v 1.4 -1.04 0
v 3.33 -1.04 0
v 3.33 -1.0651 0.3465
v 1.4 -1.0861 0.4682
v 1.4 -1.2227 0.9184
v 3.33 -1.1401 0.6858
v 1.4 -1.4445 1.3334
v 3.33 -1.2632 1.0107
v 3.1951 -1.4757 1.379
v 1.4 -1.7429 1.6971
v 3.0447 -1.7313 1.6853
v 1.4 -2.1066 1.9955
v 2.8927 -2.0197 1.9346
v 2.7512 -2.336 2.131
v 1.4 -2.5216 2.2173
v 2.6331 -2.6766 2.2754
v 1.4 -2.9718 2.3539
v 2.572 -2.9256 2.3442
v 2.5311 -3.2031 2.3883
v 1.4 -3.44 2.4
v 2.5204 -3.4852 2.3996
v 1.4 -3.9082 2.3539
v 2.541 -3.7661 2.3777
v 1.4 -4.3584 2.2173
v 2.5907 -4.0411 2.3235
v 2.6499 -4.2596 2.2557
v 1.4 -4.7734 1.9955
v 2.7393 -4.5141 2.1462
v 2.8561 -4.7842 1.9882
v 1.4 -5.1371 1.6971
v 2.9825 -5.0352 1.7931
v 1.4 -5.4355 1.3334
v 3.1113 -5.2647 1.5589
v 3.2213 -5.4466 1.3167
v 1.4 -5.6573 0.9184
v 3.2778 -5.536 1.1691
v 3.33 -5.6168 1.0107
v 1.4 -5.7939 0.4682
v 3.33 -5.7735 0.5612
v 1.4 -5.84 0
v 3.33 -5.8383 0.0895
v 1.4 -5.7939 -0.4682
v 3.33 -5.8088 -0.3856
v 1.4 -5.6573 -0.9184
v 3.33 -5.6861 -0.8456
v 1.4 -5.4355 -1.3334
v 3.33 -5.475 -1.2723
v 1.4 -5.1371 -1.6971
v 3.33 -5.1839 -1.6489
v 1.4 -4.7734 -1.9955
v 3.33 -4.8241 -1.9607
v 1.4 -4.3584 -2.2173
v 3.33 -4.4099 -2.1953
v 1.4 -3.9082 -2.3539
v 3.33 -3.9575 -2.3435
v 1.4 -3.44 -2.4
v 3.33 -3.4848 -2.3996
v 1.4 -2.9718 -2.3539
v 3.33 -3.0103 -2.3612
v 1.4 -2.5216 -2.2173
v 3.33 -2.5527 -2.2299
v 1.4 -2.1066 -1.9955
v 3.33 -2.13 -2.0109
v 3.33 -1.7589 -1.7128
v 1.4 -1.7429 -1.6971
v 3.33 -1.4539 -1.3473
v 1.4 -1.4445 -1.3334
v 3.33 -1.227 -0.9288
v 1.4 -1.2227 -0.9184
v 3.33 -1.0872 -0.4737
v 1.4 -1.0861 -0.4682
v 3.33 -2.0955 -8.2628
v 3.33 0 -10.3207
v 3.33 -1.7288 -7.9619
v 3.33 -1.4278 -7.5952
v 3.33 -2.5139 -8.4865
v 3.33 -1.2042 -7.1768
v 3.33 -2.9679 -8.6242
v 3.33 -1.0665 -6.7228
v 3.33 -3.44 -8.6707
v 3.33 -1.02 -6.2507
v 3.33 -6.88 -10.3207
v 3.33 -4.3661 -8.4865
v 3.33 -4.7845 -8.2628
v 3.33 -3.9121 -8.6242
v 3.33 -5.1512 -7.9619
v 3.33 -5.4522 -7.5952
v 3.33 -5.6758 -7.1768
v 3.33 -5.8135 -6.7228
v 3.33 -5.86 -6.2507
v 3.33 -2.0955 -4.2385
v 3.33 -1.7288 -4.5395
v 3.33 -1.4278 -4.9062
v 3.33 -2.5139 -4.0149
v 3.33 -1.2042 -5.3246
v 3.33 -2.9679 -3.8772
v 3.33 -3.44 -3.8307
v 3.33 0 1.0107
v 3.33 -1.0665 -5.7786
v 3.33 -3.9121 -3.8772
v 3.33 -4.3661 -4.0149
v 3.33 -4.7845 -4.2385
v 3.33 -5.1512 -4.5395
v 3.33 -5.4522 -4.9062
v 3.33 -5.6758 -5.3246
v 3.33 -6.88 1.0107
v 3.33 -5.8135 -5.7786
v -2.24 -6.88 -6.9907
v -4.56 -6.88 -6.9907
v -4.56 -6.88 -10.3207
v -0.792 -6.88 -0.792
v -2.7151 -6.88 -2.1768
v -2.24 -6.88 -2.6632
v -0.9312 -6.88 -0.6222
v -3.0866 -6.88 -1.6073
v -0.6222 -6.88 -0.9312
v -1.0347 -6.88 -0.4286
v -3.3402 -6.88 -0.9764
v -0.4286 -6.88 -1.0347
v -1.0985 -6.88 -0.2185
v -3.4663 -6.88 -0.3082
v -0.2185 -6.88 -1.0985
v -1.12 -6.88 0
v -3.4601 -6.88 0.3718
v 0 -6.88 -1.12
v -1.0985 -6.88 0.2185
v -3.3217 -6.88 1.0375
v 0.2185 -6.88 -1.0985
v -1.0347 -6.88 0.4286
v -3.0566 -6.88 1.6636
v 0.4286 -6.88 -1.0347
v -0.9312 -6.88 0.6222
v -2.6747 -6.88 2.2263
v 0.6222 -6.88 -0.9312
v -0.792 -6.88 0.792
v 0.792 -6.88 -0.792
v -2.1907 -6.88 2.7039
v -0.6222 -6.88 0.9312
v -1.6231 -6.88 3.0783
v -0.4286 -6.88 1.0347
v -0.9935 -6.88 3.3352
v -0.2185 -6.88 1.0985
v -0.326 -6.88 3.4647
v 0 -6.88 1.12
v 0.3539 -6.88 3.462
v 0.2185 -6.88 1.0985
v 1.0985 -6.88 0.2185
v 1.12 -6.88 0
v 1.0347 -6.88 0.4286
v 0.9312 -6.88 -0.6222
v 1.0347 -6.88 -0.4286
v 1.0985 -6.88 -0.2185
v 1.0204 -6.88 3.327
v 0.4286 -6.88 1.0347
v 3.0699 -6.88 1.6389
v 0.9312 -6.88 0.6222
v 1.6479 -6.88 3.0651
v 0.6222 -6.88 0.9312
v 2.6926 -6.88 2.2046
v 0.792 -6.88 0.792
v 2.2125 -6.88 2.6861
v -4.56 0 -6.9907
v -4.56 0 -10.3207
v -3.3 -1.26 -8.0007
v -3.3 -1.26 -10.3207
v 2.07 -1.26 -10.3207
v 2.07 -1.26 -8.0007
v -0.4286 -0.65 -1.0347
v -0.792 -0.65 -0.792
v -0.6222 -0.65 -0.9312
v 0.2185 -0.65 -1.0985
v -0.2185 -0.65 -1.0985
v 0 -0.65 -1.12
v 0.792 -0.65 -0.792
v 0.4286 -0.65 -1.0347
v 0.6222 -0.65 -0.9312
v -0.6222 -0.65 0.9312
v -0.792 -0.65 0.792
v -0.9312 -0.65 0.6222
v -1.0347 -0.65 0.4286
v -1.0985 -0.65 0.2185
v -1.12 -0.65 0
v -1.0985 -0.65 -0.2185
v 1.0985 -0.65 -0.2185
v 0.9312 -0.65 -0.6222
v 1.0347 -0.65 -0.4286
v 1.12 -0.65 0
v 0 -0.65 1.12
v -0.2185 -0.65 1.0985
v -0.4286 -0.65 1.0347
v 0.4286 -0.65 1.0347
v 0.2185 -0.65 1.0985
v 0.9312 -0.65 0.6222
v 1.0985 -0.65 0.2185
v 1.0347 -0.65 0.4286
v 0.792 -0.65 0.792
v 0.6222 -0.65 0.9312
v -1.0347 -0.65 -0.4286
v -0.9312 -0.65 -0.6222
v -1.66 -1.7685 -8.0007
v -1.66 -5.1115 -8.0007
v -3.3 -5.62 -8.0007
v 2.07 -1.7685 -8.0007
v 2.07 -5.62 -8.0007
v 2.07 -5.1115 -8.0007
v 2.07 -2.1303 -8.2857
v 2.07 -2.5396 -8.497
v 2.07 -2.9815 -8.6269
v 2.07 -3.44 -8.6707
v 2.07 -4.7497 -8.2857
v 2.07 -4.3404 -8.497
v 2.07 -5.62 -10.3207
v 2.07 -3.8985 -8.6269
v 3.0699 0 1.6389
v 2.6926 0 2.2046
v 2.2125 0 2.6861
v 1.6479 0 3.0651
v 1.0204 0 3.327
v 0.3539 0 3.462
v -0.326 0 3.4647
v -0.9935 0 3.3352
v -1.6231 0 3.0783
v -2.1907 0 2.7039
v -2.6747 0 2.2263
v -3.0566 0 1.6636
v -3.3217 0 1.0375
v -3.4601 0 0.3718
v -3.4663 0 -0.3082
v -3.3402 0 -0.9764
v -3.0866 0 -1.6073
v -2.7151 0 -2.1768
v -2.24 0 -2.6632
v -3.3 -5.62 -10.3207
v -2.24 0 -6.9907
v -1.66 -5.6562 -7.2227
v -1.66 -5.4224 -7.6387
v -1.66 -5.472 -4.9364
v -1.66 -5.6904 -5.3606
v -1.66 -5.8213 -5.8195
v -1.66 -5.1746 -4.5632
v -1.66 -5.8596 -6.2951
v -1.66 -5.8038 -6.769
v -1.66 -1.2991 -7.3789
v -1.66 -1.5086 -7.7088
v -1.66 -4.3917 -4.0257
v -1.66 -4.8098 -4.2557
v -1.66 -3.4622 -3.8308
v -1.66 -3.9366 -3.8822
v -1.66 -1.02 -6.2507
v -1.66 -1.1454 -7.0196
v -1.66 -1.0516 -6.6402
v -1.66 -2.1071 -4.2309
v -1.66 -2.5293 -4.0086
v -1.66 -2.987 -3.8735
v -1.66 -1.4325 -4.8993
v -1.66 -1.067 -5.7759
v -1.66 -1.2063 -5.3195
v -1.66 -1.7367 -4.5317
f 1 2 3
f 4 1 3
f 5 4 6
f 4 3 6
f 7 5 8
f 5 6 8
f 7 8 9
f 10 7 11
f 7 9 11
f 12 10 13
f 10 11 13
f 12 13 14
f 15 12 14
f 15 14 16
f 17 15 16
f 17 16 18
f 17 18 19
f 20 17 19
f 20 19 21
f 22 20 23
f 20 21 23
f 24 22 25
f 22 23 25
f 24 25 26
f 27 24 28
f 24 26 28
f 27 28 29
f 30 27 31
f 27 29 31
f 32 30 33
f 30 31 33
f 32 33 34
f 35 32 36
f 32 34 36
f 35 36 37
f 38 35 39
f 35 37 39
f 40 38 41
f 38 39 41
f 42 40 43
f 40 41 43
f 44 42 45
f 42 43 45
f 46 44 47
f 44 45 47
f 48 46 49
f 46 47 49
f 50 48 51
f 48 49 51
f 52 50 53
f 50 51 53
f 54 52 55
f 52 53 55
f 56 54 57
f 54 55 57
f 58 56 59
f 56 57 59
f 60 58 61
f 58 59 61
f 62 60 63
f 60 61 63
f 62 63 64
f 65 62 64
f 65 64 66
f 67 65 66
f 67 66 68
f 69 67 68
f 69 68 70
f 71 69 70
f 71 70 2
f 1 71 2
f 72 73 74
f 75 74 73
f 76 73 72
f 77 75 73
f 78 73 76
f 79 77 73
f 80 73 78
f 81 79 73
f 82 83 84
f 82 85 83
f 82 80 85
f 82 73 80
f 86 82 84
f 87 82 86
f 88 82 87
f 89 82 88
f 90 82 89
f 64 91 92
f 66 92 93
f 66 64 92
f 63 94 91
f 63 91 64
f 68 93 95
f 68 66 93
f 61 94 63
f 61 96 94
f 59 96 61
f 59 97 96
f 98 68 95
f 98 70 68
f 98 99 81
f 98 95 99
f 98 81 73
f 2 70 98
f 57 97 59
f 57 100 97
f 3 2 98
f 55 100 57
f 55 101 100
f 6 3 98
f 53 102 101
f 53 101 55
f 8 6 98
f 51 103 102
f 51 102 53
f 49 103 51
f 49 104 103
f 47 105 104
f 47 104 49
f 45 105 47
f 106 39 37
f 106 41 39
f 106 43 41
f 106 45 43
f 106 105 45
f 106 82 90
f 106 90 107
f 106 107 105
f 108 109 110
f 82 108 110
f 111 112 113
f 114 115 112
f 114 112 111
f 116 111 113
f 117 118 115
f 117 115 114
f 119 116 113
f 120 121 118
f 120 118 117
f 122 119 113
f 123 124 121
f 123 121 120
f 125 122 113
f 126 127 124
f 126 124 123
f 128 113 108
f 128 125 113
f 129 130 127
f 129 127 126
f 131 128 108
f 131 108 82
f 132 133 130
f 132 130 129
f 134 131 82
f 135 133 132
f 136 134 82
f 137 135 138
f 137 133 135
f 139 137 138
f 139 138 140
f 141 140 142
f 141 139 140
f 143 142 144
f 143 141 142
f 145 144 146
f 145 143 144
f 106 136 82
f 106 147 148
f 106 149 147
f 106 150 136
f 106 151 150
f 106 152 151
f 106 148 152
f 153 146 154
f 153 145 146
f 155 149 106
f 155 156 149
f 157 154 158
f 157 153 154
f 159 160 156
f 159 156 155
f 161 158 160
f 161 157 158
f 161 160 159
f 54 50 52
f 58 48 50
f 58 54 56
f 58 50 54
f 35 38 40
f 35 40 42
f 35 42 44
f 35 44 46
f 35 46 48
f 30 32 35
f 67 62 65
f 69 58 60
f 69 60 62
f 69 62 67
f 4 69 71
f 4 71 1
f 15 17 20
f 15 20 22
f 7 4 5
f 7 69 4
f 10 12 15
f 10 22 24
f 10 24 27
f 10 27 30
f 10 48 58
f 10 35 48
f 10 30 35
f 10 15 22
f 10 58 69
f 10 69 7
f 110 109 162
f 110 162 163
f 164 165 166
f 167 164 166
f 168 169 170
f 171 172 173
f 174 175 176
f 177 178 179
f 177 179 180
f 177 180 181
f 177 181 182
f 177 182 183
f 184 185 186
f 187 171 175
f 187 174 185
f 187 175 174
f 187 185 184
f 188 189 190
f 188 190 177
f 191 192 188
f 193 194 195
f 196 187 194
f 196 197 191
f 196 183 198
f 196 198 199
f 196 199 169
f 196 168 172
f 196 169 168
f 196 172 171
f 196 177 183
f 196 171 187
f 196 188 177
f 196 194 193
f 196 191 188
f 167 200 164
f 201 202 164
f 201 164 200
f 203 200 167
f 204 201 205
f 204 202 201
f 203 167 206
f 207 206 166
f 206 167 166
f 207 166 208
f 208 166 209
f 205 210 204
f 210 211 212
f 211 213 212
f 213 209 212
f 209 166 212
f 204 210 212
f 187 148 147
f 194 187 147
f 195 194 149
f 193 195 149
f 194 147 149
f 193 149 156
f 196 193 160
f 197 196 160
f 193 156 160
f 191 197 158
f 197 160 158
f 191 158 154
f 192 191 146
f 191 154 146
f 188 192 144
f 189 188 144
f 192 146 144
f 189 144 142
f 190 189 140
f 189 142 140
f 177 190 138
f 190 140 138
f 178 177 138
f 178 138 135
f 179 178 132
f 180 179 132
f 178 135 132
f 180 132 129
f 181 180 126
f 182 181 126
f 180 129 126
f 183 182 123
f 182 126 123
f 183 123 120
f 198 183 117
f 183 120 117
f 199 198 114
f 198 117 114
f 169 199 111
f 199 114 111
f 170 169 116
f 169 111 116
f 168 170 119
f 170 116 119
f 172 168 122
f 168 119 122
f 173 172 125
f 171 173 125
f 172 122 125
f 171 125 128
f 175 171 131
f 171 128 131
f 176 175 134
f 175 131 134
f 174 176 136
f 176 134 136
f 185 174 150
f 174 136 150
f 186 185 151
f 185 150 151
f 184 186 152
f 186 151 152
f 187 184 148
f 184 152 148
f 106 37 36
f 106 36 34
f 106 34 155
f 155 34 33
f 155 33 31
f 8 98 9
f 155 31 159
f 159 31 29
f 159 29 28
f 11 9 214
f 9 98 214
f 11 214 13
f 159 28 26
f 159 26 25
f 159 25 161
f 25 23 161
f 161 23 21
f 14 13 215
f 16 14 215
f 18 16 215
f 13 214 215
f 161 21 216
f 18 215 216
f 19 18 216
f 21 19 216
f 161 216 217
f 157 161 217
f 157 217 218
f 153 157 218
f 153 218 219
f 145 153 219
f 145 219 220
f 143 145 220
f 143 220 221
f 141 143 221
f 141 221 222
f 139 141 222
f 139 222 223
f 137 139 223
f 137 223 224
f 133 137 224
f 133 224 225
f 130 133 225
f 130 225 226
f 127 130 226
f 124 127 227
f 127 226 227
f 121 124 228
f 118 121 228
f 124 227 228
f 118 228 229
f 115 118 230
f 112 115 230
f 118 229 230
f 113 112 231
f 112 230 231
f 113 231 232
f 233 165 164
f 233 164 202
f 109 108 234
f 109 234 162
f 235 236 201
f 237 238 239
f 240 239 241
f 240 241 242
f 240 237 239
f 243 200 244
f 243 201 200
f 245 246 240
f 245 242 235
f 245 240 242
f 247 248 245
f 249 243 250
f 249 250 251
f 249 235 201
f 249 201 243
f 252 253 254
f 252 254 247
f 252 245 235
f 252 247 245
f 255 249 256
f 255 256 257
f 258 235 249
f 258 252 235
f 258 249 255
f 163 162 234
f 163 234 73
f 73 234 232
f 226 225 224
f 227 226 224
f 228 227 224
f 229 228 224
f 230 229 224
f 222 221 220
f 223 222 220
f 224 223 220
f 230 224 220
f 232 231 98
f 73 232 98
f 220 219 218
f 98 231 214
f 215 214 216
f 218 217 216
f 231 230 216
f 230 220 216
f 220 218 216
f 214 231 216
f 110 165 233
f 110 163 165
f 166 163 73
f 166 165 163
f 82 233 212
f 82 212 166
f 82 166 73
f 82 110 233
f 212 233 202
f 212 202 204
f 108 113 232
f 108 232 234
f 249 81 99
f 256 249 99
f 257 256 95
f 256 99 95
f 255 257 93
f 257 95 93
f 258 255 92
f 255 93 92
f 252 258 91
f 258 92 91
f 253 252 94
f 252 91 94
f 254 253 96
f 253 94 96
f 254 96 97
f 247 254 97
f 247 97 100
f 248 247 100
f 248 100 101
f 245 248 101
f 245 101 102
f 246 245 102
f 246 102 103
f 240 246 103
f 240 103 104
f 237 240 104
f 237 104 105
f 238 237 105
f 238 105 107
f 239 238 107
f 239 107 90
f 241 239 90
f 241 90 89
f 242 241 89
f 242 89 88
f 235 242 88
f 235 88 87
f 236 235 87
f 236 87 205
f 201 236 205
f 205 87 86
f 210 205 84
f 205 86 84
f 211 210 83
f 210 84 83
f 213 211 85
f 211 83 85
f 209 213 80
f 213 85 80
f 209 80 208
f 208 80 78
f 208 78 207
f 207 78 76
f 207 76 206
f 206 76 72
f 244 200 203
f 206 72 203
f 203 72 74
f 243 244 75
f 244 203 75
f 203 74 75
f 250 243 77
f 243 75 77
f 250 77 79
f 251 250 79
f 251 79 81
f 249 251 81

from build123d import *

# Parameters (mm, degrees)
F0_R      = 3.48
F1_DEPTH  = 6.88
F2_R      = 1.12
F3_DEPTH  = 6.23
F5_DEPTH  = 25
F7_DEPTH  = 6.88
F8_W      = 5.37
F8_H      = 4.36
F9_DEPTH  = 2.32
F10_R     = 2.4
F11_DEPTH = 1.93
F12_R     = 2.42
F13_DEPTH = 4.99


# Not quite as in the source:
# - a feature names something its author has since deleted; it is built from what else it names


with BuildPart() as f1:
    # F0 (on Front) → F1 (new body)
    with BuildSketch(Plane.XZ):
        Circle(F0_R)
    extrude(amount=F1_DEPTH)

    # F2 (on face) → F3 (cut)
    with BuildSketch(Plane.XZ.offset(6.88)):
        Circle(F2_R)
    extrude(amount=-F3_DEPTH, mode=Mode.SUBTRACT)

    # F4 (on face) → F5 (cut)
    with BuildSketch(Plane.XZ.offset(6.88)):
        Polygon((7.0880088024, -1.4447768917), (3.33, 4.3651785166), (3.33, -5.8573421486), align=None)
    extrude(amount=-F5_DEPTH, mode=Mode.SUBTRACT)

    # F6 (on face) → F7 (join)
    with BuildSketch(Plane.XZ.offset(6.88)):
        with BuildLine():
            Line((3.33, -10.3206928317), (3.33, -1.0106928317))
            ThreePointArc((3.33, -1.0106928317), (0.8809060484, -2.9691576427), (-2.24, -2.6632311203))
            Line((-2.24, -2.6632311203), (-2.24, -6.9906928317))
            Line((-2.24, -6.9906928317), (-4.56, -6.9906928317))
            Line((-4.56, -6.9906928317), (-4.56, -10.3206928317))
            Line((-4.56, -10.3206928317), (3.33, -10.3206928317))
        make_face()
    extrude(amount=-F7_DEPTH)

    # F8 (on face) → F9 (cut)
    with BuildSketch(Plane(origin=(0, 0, -10.3206928317), x_dir=(1, 0, 0), z_dir=(0, 0, -1))):
        with Locations((-0.615, 3.44)):
            Rectangle(F8_W, F8_H)
    extrude(amount=-F9_DEPTH, mode=Mode.SUBTRACT)

    # F10 (on face) → F11 (cut)
    with BuildSketch(Plane.YZ.offset(3.33)):
        with Locations((-3.44, 0)):
            Circle(F10_R)
    extrude(amount=-F11_DEPTH, mode=Mode.SUBTRACT)

    # F12 (on face) → F13 (cut)
    with BuildSketch(Plane.YZ.offset(3.33)):
        with Locations((-3.44, -6.2506928317)):
            Circle(F12_R)
    extrude(amount=-F13_DEPTH, mode=Mode.SUBTRACT)


solid = f1.part
